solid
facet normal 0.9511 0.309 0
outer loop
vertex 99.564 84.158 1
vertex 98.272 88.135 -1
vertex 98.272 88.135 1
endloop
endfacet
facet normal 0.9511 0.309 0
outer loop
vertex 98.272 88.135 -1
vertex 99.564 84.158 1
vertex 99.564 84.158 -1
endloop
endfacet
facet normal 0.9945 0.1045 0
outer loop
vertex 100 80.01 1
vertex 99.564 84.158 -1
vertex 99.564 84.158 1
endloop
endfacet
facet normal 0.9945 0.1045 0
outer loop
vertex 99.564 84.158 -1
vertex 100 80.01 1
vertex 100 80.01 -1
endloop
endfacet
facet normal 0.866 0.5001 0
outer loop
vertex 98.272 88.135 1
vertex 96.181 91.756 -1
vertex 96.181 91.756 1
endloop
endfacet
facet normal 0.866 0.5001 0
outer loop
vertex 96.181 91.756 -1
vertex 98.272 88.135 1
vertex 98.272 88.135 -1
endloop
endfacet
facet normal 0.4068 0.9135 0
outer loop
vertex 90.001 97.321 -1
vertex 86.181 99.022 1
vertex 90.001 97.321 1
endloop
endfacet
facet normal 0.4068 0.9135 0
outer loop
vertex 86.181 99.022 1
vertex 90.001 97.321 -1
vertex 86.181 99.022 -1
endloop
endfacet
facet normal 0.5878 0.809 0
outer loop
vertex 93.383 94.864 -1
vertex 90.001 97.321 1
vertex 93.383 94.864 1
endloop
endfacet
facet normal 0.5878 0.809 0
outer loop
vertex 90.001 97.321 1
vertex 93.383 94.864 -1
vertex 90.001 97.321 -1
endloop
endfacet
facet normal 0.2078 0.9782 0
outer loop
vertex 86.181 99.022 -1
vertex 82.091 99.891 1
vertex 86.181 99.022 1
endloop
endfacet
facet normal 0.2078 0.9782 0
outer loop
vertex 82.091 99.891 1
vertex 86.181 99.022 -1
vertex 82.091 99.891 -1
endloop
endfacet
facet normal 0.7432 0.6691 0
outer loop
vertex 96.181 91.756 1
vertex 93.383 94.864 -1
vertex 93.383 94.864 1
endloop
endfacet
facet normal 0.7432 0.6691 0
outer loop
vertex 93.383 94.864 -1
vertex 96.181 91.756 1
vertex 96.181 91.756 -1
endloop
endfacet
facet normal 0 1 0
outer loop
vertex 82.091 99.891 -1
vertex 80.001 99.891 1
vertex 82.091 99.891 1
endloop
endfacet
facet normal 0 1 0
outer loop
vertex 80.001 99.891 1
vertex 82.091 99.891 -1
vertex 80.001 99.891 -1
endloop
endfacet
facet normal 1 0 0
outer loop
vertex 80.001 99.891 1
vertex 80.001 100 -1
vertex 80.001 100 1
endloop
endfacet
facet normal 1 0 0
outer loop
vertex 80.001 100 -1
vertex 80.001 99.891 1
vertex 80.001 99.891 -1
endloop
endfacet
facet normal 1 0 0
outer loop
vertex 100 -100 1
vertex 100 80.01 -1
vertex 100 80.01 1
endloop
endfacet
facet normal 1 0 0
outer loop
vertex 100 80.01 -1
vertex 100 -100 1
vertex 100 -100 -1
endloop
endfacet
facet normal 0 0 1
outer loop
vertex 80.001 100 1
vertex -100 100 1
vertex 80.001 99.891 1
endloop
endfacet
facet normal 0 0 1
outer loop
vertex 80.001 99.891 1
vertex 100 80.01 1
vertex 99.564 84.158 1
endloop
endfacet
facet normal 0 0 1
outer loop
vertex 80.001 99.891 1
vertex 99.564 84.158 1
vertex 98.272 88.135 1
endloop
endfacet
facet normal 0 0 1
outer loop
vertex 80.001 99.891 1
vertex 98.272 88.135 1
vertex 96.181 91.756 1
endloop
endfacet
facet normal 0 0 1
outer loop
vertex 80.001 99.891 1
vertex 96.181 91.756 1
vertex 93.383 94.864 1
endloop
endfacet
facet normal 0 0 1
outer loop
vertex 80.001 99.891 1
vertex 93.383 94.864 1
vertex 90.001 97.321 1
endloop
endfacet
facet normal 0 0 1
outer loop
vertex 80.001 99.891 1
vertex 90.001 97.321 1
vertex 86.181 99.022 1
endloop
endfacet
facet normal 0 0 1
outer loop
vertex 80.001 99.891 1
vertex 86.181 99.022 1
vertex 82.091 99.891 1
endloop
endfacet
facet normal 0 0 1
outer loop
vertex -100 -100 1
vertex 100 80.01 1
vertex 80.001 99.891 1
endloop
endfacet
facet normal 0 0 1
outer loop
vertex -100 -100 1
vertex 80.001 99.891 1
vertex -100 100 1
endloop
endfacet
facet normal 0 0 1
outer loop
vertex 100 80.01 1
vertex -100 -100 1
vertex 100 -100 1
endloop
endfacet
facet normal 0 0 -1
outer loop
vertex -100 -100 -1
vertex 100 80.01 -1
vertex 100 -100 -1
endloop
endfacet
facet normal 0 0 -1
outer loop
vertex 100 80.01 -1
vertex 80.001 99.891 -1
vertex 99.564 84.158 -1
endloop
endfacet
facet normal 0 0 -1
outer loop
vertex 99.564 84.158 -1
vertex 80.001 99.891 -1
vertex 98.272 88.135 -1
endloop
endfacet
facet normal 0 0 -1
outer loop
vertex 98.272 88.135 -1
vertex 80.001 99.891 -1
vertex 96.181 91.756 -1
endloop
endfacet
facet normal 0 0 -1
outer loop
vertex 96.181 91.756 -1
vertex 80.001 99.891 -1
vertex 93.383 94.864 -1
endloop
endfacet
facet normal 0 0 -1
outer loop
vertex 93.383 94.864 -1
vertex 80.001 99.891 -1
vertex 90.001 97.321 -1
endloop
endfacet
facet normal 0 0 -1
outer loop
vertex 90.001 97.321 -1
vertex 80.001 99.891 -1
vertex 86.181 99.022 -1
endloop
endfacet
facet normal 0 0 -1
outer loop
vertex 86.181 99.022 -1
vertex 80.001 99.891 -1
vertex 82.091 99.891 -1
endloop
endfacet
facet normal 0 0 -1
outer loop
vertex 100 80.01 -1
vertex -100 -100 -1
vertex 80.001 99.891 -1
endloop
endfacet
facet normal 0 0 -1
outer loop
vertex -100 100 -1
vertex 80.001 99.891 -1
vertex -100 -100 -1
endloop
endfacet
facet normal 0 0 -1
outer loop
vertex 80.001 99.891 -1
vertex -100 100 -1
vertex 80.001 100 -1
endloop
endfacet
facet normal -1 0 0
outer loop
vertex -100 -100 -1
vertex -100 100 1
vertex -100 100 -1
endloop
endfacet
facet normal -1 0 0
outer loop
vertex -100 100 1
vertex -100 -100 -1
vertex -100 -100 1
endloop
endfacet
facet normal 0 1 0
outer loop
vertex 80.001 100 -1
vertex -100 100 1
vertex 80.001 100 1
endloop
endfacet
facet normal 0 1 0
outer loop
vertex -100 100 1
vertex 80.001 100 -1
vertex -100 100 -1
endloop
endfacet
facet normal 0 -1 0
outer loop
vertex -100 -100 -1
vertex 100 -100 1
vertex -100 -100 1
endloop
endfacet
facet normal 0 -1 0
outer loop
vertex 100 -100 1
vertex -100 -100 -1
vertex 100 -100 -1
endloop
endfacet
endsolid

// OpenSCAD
module corner(size, r) {
	difference() {
		cube([r, r, size[2]+0.002]);
		translate([-0.001, -0.001, -0.001])
		intersection() {
			cylinder(r=r+0.001, h=size[2]+0.2, center=false);
			cube([r+0.001, r+0.001, size[2]+0.2]);
		}
	}
}

module rcube(size, r) {
	difference() {
	cube(size, true);

	translate([size[0]/2 - r + 0.001, size[1]/2 - r + 0.001, -size[2] / 2 - 0.001])
	corner(size, r);
	}
}

rcube([200, 200, 2], 20);
